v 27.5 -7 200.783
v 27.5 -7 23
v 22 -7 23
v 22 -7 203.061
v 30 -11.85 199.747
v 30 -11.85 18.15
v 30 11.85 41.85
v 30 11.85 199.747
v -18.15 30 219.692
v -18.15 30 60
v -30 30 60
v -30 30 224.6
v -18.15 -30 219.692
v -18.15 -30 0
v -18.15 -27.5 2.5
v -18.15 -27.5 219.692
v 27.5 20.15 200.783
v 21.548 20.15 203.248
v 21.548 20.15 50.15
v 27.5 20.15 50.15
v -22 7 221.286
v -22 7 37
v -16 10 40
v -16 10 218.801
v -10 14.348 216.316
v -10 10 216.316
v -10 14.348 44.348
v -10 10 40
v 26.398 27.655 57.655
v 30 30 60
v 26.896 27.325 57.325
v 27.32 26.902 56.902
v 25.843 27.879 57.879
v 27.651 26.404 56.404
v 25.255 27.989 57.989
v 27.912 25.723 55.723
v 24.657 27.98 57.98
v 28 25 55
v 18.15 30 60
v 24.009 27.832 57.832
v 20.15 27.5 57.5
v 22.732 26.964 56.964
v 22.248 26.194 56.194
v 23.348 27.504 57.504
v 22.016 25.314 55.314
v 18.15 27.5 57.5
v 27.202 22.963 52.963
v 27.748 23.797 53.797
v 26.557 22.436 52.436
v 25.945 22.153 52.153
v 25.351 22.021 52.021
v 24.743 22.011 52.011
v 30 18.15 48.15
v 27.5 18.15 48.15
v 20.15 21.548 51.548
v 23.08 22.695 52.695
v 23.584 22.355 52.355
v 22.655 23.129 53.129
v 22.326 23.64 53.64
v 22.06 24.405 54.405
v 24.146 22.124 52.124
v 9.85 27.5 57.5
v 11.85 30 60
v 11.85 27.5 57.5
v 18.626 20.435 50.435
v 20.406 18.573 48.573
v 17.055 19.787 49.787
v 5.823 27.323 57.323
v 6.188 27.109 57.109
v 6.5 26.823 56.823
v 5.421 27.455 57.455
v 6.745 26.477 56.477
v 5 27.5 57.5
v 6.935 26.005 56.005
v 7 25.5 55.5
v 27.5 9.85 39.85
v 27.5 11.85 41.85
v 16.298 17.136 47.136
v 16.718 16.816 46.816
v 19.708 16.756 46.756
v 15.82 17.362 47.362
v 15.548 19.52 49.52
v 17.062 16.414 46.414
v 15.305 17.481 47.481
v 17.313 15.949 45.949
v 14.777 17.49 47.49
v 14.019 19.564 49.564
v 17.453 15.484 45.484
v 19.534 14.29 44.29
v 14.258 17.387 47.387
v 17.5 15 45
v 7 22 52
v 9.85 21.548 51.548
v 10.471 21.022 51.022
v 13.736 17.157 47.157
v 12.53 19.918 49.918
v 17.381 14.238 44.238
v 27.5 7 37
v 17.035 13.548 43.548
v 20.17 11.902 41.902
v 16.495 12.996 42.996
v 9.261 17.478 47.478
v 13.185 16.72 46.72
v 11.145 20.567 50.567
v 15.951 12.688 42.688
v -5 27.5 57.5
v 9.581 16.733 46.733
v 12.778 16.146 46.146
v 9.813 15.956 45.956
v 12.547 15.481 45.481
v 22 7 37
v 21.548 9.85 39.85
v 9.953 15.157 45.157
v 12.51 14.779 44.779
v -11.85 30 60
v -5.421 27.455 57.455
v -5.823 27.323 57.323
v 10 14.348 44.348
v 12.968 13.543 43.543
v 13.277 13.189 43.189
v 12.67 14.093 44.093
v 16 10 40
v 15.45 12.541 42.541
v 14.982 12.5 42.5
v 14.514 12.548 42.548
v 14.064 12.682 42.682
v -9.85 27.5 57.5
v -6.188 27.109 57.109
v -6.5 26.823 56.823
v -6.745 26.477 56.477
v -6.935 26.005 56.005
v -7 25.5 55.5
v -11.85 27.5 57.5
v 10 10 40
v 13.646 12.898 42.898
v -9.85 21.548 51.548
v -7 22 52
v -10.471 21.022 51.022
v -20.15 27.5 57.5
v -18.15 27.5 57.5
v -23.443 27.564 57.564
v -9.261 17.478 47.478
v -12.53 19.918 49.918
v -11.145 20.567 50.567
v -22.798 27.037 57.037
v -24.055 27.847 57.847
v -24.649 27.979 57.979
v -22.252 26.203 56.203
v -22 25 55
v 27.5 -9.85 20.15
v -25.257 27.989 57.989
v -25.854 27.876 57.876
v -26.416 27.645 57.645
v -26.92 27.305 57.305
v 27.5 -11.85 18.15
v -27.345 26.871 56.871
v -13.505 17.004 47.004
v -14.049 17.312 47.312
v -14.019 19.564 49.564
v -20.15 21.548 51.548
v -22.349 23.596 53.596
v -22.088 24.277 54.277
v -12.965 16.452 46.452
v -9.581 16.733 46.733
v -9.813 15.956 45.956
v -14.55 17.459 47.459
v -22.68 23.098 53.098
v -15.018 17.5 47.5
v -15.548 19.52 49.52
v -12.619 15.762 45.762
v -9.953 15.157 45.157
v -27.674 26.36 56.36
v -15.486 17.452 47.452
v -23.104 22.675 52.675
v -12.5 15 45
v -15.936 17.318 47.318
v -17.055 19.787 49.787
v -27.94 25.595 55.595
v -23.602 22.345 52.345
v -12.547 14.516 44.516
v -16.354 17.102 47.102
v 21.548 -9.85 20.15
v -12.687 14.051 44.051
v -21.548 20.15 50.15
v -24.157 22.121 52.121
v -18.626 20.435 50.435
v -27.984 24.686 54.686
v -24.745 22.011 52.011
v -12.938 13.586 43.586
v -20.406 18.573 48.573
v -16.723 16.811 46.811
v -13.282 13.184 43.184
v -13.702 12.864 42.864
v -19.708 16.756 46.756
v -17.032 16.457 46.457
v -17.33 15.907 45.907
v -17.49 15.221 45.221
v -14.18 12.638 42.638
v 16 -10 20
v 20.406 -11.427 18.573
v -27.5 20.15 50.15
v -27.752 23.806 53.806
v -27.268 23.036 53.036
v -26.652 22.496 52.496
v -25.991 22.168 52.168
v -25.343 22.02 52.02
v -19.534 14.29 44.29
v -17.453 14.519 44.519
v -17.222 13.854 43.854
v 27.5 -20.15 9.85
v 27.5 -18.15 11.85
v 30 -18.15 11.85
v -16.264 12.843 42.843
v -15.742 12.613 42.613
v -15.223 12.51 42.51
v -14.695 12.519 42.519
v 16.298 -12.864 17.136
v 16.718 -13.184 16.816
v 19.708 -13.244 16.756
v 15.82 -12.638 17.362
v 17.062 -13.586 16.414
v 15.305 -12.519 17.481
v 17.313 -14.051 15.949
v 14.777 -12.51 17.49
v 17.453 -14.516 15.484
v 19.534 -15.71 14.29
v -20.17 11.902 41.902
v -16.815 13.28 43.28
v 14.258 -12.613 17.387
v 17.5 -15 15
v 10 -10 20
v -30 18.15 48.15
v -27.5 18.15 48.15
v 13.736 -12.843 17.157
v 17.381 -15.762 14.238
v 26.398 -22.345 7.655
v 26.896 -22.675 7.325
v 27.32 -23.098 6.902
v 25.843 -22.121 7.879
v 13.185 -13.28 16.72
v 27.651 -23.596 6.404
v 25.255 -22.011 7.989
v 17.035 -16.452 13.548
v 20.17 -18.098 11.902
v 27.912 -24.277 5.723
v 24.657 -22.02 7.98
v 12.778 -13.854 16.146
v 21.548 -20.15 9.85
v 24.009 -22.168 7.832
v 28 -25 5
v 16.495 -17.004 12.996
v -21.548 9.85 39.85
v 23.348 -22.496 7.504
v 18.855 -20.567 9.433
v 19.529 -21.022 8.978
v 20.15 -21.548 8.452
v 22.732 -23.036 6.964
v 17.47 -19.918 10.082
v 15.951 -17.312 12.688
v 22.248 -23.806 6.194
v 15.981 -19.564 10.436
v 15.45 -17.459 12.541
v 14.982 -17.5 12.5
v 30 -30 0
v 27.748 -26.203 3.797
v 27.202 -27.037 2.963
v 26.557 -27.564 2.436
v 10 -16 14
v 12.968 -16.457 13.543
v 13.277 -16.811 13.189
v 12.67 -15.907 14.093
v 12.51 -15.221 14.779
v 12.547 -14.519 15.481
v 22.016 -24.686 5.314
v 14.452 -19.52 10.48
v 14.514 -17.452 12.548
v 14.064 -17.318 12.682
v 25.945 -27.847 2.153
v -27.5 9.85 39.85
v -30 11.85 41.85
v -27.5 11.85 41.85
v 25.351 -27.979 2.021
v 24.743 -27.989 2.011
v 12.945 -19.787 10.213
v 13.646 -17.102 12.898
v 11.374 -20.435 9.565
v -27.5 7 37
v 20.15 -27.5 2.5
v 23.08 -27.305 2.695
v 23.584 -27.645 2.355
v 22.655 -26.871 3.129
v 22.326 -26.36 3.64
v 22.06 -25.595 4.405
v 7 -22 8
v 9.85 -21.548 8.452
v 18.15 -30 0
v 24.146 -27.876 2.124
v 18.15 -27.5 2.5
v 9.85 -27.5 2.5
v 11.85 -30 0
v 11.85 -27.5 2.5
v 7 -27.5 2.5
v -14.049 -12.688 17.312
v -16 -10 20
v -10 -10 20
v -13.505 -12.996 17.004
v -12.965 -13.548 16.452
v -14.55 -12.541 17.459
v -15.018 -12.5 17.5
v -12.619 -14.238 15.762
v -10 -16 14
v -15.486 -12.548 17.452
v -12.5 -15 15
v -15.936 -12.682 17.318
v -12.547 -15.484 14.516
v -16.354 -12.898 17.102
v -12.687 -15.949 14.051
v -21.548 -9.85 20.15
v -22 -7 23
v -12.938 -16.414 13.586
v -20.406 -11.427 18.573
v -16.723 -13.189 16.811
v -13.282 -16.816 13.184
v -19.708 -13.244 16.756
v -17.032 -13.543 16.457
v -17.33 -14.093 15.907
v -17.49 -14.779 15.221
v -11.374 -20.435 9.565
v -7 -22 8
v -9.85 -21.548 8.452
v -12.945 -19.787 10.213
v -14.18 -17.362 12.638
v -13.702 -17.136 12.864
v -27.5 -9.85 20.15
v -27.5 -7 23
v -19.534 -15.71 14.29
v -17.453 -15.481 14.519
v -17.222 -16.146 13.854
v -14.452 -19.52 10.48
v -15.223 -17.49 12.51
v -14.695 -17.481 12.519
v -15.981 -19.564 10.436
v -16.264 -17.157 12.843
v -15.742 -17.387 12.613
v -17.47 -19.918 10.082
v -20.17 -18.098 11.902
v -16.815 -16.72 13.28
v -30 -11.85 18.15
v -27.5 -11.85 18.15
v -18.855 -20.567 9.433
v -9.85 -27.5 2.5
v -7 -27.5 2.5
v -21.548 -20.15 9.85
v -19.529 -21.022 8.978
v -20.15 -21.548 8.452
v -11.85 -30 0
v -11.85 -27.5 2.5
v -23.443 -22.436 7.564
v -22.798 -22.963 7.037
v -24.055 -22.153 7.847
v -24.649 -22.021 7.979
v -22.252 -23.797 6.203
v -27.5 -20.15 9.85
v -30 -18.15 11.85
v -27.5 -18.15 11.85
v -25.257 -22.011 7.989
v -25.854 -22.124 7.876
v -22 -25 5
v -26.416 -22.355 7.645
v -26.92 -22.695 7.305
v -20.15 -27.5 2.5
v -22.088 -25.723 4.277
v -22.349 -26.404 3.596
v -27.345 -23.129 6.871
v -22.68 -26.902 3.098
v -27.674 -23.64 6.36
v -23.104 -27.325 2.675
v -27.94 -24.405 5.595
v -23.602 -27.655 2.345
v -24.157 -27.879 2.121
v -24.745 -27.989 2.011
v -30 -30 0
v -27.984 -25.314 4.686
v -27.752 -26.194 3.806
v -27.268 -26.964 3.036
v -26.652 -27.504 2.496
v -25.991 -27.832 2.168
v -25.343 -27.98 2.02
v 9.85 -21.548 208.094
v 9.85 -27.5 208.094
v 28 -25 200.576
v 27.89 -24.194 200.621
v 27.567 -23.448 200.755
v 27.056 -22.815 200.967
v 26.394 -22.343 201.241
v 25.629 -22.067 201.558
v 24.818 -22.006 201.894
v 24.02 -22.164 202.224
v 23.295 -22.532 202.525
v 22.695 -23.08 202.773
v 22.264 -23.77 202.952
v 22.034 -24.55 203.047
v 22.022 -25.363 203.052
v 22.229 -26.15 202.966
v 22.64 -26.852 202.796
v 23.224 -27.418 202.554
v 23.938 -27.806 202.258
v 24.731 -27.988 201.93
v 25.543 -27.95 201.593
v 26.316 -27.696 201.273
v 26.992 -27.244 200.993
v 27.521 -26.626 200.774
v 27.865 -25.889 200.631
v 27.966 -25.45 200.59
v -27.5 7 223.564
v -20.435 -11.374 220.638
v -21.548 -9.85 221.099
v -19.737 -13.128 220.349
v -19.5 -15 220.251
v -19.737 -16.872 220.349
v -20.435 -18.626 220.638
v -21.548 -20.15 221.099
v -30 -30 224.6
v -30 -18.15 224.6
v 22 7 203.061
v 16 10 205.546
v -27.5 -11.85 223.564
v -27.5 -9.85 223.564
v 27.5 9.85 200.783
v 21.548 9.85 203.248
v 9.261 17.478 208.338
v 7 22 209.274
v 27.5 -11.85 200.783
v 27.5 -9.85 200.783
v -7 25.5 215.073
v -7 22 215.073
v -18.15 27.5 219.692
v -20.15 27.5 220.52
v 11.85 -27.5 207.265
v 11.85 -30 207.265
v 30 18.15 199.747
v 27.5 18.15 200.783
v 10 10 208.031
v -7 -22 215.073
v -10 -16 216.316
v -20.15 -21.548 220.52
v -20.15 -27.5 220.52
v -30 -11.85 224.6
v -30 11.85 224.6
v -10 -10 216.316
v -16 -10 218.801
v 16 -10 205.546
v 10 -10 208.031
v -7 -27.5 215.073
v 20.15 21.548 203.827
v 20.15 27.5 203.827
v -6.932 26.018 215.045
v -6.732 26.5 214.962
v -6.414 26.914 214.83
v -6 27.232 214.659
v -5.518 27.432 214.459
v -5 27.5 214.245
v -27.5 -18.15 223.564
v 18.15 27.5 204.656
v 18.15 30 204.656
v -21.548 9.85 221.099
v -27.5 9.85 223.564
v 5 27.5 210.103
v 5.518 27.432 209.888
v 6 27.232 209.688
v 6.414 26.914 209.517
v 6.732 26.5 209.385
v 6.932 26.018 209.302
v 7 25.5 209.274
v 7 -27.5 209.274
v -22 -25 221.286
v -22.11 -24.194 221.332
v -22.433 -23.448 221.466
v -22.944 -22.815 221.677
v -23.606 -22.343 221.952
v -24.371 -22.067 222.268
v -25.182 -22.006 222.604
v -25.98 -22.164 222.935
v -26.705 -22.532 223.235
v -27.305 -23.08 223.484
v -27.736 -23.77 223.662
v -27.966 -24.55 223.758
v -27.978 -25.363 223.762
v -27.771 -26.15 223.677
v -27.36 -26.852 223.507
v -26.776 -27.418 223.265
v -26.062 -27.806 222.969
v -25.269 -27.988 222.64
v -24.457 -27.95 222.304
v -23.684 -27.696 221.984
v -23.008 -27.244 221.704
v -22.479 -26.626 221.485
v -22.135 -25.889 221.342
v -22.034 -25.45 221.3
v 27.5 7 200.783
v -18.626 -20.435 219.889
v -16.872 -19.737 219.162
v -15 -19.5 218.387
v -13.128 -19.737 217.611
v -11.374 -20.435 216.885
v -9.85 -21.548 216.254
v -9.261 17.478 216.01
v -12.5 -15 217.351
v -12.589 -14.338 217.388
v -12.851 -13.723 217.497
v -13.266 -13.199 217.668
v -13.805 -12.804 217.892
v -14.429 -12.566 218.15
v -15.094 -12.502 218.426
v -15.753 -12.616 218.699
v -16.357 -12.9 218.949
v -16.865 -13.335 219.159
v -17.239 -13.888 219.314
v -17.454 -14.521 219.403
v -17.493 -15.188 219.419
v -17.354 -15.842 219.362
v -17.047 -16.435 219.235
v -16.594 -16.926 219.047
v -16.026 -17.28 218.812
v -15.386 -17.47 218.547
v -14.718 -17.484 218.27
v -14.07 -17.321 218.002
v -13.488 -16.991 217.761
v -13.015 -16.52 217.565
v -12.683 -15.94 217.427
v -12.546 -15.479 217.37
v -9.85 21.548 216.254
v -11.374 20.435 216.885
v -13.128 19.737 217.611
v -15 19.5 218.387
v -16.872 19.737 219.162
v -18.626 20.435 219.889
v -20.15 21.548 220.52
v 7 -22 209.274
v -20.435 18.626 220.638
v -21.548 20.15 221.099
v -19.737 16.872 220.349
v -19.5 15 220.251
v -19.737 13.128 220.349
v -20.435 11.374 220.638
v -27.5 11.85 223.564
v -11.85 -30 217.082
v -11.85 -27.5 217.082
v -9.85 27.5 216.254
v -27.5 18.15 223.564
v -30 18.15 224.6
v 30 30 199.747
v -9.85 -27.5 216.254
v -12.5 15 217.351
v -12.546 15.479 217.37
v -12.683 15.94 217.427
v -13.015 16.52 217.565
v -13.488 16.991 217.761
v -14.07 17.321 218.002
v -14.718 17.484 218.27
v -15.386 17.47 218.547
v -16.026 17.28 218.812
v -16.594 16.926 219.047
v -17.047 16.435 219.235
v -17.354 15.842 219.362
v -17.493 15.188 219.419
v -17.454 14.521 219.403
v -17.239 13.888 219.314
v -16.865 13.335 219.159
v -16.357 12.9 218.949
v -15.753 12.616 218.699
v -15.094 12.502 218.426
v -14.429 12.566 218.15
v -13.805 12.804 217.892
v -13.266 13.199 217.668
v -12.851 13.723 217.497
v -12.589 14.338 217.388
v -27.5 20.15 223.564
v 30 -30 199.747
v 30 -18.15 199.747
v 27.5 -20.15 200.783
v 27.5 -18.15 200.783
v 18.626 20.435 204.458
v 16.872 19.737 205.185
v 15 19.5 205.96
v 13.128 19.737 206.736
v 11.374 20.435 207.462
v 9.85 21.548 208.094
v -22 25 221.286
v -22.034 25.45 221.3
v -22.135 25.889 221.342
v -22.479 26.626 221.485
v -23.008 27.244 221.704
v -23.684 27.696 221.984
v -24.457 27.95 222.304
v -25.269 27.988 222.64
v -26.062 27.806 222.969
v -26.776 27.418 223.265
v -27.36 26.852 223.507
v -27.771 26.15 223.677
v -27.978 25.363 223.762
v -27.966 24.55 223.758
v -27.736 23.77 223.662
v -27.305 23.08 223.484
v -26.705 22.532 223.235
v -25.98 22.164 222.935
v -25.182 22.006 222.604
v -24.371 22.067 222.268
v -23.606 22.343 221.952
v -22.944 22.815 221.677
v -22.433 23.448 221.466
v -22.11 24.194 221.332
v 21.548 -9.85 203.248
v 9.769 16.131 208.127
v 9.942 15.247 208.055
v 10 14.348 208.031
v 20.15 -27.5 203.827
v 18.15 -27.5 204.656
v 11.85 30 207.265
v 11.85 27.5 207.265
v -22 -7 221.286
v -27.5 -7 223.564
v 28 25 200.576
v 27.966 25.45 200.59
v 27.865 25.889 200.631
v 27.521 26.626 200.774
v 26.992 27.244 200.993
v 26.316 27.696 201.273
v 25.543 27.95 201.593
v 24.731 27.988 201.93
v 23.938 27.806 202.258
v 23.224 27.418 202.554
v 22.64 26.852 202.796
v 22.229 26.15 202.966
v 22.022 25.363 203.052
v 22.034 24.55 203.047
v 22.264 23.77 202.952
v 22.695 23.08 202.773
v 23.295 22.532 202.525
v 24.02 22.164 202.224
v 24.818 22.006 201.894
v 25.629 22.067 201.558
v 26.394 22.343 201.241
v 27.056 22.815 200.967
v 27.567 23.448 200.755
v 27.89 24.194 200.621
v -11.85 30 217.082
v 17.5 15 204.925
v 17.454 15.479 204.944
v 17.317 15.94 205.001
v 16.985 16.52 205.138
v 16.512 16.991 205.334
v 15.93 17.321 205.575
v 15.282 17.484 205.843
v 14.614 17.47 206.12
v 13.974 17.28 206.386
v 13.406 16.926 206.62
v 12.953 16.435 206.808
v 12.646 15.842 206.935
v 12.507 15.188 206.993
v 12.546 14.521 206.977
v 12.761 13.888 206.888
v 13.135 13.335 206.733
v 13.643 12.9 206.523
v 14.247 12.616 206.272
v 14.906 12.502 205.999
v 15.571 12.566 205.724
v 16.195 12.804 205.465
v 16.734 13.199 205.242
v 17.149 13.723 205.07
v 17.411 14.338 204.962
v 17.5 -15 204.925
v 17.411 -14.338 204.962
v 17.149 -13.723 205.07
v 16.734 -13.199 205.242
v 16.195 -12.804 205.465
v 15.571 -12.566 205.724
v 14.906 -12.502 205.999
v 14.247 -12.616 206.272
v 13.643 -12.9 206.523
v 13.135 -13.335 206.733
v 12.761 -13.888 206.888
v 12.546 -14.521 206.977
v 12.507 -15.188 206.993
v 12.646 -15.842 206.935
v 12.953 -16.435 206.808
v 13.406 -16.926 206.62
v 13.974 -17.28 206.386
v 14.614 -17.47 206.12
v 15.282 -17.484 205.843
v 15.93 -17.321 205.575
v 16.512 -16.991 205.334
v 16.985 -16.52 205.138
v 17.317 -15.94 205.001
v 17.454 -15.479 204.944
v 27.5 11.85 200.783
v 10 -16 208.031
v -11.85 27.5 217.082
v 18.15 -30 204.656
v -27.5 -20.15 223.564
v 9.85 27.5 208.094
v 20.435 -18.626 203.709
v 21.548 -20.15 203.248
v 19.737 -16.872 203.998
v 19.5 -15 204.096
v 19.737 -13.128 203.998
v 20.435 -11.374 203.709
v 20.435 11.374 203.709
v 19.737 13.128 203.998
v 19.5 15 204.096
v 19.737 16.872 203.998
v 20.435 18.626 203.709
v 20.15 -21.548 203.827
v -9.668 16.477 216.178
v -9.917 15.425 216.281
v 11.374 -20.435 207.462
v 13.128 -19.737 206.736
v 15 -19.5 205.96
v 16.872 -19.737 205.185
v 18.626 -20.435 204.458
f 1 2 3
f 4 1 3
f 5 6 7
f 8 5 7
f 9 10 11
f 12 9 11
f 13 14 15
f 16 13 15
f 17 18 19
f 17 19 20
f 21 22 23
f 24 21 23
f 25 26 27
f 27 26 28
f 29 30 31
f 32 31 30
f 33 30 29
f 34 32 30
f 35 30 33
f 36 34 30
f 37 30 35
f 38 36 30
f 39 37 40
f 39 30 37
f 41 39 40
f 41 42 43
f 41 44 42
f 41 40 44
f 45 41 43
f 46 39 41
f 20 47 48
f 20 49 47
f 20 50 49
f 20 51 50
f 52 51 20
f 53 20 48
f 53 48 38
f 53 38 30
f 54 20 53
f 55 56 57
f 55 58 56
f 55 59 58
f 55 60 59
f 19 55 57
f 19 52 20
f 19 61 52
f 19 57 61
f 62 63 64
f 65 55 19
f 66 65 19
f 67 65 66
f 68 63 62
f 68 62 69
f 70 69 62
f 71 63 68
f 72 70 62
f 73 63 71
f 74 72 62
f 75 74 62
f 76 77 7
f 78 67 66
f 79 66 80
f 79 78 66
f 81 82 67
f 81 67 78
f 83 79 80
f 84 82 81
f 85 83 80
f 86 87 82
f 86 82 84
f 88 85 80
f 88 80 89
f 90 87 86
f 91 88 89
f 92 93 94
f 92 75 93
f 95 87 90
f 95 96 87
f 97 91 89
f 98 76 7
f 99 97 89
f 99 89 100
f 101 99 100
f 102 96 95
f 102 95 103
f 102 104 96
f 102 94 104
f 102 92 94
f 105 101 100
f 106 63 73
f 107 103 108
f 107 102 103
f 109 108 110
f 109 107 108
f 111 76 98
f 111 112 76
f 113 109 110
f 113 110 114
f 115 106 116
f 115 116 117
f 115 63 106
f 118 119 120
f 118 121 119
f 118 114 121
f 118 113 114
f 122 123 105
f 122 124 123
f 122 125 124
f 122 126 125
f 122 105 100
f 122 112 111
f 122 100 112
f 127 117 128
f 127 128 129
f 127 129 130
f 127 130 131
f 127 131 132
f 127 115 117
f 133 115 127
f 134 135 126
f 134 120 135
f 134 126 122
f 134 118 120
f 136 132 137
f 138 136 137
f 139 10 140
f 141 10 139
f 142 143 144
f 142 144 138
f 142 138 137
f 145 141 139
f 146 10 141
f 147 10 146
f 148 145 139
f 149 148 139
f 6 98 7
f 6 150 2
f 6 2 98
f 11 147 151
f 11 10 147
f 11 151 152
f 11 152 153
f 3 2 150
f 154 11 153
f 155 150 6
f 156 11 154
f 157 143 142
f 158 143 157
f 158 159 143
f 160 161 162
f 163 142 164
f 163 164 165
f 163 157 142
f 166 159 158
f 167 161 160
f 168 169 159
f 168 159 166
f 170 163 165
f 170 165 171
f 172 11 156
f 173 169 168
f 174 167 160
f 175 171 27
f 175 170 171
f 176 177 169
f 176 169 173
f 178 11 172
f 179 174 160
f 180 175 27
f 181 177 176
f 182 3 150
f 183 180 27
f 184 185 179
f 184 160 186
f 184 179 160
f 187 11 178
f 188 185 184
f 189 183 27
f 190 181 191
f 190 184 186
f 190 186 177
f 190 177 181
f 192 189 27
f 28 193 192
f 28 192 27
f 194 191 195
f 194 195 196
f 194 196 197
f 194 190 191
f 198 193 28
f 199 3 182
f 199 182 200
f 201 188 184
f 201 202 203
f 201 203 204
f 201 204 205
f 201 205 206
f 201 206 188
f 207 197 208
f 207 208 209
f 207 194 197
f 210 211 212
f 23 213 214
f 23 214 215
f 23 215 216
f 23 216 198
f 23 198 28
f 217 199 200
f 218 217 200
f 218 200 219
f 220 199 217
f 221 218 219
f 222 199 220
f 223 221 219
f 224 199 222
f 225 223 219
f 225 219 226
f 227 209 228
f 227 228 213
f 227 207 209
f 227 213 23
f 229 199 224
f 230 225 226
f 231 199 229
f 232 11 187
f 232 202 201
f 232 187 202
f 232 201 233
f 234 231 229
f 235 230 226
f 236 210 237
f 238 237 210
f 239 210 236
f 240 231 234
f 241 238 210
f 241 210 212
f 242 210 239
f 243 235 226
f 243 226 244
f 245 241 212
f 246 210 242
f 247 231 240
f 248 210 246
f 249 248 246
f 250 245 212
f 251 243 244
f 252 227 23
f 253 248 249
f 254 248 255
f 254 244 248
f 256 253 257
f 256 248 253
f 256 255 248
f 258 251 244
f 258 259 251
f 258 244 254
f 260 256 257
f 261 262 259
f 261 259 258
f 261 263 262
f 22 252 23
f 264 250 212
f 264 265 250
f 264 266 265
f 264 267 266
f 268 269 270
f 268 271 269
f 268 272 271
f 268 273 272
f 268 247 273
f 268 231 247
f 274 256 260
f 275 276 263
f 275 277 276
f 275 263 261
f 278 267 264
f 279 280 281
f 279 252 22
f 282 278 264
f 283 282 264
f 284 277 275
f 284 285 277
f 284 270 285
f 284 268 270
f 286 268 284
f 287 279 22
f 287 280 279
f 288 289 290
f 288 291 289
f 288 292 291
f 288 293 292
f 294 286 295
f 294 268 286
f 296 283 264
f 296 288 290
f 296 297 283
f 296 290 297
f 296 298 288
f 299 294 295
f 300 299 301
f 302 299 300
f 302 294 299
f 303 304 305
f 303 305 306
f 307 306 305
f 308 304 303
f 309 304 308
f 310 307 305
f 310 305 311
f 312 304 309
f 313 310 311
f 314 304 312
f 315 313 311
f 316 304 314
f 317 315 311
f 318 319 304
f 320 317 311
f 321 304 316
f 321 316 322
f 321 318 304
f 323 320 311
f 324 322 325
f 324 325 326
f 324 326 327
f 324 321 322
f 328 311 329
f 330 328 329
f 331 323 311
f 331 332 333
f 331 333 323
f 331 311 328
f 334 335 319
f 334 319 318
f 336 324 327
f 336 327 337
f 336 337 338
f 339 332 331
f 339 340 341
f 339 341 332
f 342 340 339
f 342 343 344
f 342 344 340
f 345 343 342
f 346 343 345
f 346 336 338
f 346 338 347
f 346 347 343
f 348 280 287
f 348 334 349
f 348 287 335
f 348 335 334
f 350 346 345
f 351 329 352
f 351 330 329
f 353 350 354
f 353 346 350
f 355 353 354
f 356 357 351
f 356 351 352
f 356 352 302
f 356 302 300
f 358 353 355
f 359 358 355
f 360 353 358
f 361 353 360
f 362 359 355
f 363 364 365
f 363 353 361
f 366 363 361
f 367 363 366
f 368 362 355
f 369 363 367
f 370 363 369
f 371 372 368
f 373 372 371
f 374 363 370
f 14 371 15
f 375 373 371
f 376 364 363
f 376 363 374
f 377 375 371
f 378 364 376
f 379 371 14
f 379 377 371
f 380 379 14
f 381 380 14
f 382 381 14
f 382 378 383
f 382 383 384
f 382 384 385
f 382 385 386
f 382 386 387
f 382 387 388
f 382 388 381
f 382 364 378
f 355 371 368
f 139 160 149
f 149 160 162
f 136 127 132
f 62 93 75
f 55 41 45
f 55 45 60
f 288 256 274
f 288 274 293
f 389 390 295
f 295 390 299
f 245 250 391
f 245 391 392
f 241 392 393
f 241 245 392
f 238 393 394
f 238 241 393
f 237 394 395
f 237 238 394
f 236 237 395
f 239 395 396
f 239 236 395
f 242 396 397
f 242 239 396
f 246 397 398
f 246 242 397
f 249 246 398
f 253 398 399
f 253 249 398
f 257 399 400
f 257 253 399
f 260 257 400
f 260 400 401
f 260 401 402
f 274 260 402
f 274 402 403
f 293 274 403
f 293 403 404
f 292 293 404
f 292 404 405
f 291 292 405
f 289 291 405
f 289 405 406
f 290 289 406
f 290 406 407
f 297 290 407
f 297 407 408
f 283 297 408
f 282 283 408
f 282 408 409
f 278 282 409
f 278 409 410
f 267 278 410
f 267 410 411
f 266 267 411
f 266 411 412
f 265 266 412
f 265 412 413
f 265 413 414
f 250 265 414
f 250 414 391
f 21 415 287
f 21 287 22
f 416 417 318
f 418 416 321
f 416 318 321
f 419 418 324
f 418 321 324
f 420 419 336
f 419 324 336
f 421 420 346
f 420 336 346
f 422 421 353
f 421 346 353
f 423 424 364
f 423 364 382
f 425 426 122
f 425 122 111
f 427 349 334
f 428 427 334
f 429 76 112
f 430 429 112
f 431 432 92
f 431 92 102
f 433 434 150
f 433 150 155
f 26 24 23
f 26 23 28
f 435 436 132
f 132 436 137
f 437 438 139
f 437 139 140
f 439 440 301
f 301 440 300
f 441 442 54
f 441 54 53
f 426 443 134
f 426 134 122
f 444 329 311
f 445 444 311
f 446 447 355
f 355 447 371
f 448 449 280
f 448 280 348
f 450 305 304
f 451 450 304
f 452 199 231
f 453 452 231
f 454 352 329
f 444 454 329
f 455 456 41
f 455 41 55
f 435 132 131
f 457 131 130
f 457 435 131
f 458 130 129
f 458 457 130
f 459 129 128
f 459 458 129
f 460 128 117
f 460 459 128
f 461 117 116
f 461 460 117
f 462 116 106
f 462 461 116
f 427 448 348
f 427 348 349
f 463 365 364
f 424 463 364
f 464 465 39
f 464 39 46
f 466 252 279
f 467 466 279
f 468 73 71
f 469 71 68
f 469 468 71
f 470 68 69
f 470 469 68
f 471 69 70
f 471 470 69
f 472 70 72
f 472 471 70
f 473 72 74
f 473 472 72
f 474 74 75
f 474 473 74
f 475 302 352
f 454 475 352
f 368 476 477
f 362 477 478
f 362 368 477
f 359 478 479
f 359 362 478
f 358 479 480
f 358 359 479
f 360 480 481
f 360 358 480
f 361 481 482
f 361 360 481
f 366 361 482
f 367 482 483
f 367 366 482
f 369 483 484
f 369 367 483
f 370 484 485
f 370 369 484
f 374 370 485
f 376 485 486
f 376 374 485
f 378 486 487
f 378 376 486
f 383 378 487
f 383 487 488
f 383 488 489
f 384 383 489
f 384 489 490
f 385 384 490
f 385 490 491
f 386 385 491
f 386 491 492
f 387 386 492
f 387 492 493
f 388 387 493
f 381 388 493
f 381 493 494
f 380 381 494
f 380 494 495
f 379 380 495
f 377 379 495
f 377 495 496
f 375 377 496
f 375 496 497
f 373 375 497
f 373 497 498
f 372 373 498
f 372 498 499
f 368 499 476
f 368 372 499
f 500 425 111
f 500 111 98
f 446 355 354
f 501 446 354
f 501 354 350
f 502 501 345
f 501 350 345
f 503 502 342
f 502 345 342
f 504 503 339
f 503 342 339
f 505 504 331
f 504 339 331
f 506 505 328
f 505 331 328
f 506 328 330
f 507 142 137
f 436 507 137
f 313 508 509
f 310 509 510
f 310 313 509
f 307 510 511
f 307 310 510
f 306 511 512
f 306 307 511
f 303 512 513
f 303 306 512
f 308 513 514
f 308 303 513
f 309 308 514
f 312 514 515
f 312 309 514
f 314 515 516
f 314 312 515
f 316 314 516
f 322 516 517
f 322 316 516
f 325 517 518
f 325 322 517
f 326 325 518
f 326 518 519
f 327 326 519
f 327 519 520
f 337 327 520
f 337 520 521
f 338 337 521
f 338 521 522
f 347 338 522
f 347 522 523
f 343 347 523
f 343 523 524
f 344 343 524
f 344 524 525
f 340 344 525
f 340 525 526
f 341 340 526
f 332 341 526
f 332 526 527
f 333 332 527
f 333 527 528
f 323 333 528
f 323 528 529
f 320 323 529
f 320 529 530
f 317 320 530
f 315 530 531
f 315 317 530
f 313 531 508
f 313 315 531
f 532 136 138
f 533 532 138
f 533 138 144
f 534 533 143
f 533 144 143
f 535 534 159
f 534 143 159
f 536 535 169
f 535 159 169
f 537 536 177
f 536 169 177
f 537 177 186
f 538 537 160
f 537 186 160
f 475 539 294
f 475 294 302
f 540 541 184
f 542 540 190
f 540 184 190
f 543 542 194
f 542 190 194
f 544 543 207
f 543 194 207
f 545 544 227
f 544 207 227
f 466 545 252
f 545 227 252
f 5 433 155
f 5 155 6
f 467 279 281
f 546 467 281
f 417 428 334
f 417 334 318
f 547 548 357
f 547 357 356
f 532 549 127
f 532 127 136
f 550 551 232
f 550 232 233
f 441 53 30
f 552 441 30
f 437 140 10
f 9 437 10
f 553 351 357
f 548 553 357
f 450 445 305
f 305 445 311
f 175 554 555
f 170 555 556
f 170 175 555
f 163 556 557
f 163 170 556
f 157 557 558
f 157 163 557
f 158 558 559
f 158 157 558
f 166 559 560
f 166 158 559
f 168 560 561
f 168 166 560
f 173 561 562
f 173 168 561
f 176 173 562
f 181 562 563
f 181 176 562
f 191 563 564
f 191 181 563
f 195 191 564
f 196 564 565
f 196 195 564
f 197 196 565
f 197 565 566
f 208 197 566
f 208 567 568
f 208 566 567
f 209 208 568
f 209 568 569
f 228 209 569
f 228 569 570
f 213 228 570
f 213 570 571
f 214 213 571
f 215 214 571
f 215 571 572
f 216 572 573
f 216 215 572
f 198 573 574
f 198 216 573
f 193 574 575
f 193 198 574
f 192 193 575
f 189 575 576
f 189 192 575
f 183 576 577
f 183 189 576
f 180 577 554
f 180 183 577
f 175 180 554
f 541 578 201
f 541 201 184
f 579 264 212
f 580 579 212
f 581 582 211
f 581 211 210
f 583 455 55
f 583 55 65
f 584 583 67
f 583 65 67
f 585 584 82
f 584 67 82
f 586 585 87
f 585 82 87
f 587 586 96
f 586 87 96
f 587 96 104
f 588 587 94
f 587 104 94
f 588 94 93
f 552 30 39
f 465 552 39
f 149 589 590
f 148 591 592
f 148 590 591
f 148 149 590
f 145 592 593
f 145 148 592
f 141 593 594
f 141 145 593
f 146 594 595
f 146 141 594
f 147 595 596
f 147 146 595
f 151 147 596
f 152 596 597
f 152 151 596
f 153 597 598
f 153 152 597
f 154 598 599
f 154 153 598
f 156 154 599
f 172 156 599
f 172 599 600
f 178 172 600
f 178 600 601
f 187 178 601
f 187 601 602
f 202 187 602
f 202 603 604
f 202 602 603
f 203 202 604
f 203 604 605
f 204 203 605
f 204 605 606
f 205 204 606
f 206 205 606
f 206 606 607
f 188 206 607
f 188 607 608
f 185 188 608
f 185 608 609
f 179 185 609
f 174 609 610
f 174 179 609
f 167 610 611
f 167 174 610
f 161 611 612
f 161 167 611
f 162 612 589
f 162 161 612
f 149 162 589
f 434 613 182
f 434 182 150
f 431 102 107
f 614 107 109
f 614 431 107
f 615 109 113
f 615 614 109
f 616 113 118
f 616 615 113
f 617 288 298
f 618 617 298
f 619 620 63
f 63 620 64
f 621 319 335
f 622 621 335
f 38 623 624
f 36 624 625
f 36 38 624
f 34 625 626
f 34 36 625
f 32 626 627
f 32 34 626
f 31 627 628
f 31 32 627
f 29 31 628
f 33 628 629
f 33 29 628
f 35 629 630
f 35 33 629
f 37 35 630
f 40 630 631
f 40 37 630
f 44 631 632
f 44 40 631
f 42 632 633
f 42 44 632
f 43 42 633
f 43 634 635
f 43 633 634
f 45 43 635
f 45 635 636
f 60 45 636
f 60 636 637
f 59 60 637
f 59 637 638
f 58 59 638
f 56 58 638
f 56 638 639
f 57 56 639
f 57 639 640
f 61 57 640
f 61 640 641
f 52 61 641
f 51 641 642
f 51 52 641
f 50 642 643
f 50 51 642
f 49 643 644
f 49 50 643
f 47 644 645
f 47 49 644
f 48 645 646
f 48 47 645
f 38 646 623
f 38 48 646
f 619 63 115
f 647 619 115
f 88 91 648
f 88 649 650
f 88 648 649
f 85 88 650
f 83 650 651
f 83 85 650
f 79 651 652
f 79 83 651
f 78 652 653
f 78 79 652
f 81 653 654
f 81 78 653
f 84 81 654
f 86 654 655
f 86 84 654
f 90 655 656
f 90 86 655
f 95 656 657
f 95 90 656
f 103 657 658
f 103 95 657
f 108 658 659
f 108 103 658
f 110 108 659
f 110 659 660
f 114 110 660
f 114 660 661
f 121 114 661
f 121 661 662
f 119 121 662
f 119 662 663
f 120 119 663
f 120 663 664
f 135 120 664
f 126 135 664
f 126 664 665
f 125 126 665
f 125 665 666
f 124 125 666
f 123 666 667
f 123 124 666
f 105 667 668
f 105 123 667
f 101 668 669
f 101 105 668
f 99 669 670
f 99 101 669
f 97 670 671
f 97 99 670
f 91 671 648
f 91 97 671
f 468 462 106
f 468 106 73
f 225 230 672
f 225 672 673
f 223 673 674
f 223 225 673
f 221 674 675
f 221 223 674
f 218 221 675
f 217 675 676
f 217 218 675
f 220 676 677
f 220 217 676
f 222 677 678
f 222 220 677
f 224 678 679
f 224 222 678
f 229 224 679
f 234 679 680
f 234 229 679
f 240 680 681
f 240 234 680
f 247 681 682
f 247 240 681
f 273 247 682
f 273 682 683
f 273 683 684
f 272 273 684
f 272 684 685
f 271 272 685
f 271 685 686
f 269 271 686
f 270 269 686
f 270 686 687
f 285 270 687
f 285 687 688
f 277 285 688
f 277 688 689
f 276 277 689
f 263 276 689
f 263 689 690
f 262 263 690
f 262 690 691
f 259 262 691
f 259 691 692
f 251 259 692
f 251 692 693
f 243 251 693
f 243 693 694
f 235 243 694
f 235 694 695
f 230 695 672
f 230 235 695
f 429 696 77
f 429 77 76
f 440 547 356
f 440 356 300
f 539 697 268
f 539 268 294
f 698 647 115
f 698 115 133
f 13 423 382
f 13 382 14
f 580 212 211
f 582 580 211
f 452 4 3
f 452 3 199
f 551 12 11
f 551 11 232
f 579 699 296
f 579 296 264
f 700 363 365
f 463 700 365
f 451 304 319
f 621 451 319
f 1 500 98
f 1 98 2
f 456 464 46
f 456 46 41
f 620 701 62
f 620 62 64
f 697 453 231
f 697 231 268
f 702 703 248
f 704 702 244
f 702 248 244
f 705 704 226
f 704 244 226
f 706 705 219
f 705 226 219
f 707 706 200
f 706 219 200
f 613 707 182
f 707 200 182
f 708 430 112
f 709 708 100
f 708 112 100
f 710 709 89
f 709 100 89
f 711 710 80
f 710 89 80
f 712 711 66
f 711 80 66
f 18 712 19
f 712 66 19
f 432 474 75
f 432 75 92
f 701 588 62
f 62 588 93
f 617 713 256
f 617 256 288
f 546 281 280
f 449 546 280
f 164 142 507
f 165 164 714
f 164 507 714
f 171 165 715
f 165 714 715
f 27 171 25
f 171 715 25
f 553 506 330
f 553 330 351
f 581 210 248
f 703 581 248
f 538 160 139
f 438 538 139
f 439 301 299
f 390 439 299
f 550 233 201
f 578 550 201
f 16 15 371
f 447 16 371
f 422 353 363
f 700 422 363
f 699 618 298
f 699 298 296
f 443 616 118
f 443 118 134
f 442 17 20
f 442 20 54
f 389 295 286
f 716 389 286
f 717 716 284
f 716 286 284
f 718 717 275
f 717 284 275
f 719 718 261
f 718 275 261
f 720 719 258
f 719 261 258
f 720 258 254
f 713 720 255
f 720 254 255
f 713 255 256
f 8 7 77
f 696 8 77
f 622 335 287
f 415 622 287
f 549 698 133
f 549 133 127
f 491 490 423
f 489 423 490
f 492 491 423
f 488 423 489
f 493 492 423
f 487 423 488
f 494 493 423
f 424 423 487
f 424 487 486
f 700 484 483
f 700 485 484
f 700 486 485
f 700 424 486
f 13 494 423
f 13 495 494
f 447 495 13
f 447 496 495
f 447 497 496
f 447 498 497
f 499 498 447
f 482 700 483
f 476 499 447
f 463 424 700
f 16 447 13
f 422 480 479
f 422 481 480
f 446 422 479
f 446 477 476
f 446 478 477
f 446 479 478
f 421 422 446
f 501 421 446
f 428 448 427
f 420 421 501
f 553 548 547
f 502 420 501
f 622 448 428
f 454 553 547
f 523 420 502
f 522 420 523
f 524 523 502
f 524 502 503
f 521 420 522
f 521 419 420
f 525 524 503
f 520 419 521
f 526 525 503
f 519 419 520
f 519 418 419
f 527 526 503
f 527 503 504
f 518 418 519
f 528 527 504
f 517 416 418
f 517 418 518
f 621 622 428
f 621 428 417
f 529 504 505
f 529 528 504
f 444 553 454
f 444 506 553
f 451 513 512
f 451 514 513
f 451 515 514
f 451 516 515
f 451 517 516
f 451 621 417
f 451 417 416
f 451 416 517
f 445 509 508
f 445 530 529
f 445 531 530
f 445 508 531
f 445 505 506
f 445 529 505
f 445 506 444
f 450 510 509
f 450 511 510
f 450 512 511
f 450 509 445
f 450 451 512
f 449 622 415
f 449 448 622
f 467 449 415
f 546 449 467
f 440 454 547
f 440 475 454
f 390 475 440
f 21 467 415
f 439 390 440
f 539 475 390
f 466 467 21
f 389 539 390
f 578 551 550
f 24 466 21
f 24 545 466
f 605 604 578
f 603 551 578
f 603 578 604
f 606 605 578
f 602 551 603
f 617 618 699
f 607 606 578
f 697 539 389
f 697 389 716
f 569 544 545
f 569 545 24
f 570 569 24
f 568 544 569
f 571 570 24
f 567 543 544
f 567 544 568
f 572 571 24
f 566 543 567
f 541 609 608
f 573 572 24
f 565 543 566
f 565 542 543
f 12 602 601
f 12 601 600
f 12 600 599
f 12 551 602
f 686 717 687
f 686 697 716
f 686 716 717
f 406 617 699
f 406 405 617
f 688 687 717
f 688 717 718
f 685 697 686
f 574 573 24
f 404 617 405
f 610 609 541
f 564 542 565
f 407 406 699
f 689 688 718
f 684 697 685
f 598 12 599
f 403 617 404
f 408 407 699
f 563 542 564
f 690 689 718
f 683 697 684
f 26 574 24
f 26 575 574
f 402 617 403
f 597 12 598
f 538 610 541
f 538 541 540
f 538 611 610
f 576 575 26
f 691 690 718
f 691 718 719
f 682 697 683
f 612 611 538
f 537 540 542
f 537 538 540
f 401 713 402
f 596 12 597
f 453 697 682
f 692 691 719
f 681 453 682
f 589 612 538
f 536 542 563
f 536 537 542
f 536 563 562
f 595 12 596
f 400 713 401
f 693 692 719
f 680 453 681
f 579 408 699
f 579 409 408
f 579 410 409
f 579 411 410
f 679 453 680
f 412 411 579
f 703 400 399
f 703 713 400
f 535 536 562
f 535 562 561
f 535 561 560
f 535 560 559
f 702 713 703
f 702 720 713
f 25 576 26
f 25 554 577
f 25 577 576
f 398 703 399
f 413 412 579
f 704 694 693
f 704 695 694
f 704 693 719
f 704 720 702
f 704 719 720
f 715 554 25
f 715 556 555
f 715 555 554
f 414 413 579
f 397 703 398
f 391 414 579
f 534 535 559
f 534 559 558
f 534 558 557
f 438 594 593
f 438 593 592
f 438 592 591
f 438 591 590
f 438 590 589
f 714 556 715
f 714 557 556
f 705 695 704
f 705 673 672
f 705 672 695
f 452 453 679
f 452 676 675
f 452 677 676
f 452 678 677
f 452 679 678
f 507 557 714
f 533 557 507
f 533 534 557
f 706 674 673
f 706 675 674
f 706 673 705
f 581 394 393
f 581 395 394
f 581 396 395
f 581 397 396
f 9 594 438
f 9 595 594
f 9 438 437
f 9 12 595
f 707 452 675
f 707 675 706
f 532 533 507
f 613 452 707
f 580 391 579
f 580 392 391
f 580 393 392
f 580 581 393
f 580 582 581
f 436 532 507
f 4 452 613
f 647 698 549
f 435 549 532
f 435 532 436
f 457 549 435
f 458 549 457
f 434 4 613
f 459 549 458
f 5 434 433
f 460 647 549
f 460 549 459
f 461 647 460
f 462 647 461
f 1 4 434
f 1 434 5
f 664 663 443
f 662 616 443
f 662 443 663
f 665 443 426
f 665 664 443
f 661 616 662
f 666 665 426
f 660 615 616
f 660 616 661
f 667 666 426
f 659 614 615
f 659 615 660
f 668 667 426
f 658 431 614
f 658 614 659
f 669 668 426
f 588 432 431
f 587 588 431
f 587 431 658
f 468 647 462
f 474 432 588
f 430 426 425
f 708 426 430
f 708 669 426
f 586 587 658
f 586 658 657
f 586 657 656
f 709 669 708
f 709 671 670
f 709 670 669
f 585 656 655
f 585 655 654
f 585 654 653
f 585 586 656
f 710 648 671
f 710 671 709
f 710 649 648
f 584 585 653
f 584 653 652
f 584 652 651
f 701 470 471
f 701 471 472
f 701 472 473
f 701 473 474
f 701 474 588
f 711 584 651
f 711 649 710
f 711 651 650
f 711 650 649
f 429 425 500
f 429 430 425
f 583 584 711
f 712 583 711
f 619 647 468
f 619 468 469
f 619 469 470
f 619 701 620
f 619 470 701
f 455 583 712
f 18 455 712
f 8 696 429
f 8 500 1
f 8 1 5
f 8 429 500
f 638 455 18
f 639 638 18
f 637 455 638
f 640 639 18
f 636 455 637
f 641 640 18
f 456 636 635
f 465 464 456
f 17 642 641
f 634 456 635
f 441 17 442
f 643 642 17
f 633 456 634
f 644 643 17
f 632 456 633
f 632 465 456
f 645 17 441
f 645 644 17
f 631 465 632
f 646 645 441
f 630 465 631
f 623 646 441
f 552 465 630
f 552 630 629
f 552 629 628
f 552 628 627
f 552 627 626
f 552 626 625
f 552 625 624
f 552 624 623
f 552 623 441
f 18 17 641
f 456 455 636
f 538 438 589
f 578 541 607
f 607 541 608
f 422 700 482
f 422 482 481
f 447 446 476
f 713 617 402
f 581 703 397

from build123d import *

# Parameters (mm, degrees)
F0_R          = 3
F0_R_2        = 2.5
F1_DEPTH      = 224.6
F2_R          = 2
F3_R          = 7
F6_DEPTH      = 30
F6_DEPTH_BACK = 30
F8_DEPTH      = 30
F8_DEPTH_BACK = 30


# Not quite as in the source:
# - a feature names something its author has since deleted; it is built from what else it names


with BuildPart() as f1:
    # F0 (on Top) → F1 (new body)
    with BuildSketch(Plane.XY):
        with BuildLine():
            Line((18.15, -30), (30, -30))
            Line((30, -30), (30, -18.15))
            Line((30, -18.15), (27.5, -18.15))
            Line((27.5, -18.15), (27.5, -20.15))
            Line((27.5, -20.15), (21.5477069044, -20.15))
            ThreePointArc((21.5477069044, -20.15), (19.5, -15), (21.5477069044, -9.85))
            Line((21.5477069044, -9.85), (27.5, -9.85))
            Line((27.5, -9.85), (27.5, -11.85))
            Line((27.5, -11.85), (30, -11.85))
            Line((30, -11.85), (30, 11.85))
            Line((30, 11.85), (27.5, 11.85))
            Line((27.5, 11.85), (27.5, 9.85))
            Line((27.5, 9.85), (21.5477069044, 9.85))
            ThreePointArc((21.5477069044, 9.85), (19.5, 15), (21.5477069044, 20.15))
            Line((21.5477069044, 20.15), (27.5, 20.15))
            Line((27.5, 20.15), (27.5, 18.15))
            Line((27.5, 18.15), (30, 18.15))
            Line((30, 18.15), (30, 30))
            Line((30, 30), (18.15, 30))
            Line((18.15, 30), (18.15, 27.5))
            Line((18.15, 27.5), (20.15, 27.5))
            Line((20.15, 27.5), (20.15, 21.5477069044))
            ThreePointArc((20.15, 21.5477069044), (15, 19.5), (9.85, 21.5477069044))
            Line((9.85, 21.5477069044), (9.85, 27.5))
            Line((9.85, 27.5), (11.85, 27.5))
            Line((11.85, 27.5), (11.85, 30))
            Line((11.85, 30), (-11.85, 30))
            Line((-11.85, 30), (-11.85, 27.5))
            Line((-11.85, 27.5), (-9.85, 27.5))
            Line((-9.85, 27.5), (-9.85, 21.5477069044))
            ThreePointArc((-9.85, 21.5477069044), (-15, 19.5), (-20.15, 21.5477069044))
            Line((-20.15, 21.5477069044), (-20.15, 27.5))
            Line((-20.15, 27.5), (-18.15, 27.5))
            Line((-18.15, 27.5), (-18.15, 30))
            Line((-18.15, 30), (-30, 30))
            Line((-30, 30), (-30, 18.15))
            Line((-30, 18.15), (-27.5, 18.15))
            Line((-27.5, 18.15), (-27.5, 20.15))
            Line((-27.5, 20.15), (-21.5477069044, 20.15))
            ThreePointArc((-21.5477069044, 20.15), (-19.5, 15), (-21.5477069044, 9.85))
            Line((-21.5477069044, 9.85), (-27.5, 9.85))
            Line((-27.5, 9.85), (-27.5, 11.85))
            Line((-27.5, 11.85), (-30, 11.85))
            Line((-30, 11.85), (-30, -11.85))
            Line((-30, -11.85), (-27.5, -11.85))
            Line((-27.5, -11.85), (-27.5, -9.85))
            Line((-27.5, -9.85), (-21.5477069044, -9.85))
            ThreePointArc((-21.5477069044, -9.85), (-19.5, -15), (-21.5477069044, -20.15))
            Line((-21.5477069044, -20.15), (-27.5, -20.15))
            Line((-27.5, -20.15), (-27.5, -18.15))
            Line((-27.5, -18.15), (-30, -18.15))
            Line((-30, -18.15), (-30, -30))
            Line((-30, -30), (-18.15, -30))
            Line((-18.15, -30), (-18.15, -27.5))
            Line((-18.15, -27.5), (-20.15, -27.5))
            Line((-20.15, -27.5), (-20.15, -21.5477069044))
            ThreePointArc((-20.15, -21.5477069044), (-15, -19.5), (-9.85, -21.5477069044))
            Line((-9.85, -21.5477069044), (-9.85, -27.5))
            Line((-9.85, -27.5), (-11.85, -27.5))
            Line((-11.85, -27.5), (-11.85, -30))
            Line((-11.85, -30), (11.85, -30))
            Line((11.85, -30), (11.85, -27.5))
            Line((11.85, -27.5), (9.85, -27.5))
            Line((9.85, -27.5), (9.85, -21.5477069044))
            ThreePointArc((9.85, -21.5477069044), (15, -19.5), (20.15, -21.5477069044))
            Line((20.15, -21.5477069044), (20.15, -27.5))
            Line((20.15, -27.5), (18.15, -27.5))
            Line((18.15, -27.5), (18.15, -30))
        make_face()
        with Locations((-25, -25)):
            Circle(F0_R, mode=Mode.SUBTRACT)
        with Locations((-15, -15)):
            Circle(F0_R_2, mode=Mode.SUBTRACT)
        with Locations((25, -25)):
            Circle(F0_R, mode=Mode.SUBTRACT)
        with Locations((15, -15)):
            Circle(F0_R_2, mode=Mode.SUBTRACT)
        with Locations((-25, 25)):
            Circle(F0_R, mode=Mode.SUBTRACT)
        with Locations((-15, 15)):
            Circle(F0_R_2, mode=Mode.SUBTRACT)
        Polygon((-7, 22), (-7, 27.5), (0, 27.5), (7, 27.5), (7, 22), (10, 16), (10, 10), (16, 10), (22, 7), (27.5, 7), (27.5, 0), (27.5, -7), (22, -7), (16, -10), (10, -10), (10, -16), (7, -22), (7, -27.5), (0, -27.5), (-7, -27.5), (-7, -22), (-10, -16), (-10, -10), (-16, -10), (-22, -7), (-27.5, -7), (-27.5, 0), (-27.5, 7), (-22, 7), (-16, 10), (-10, 10), (-10, 16), align=None, mode=Mode.SUBTRACT)
        with Locations((15, 15)):
            Circle(F0_R_2, mode=Mode.SUBTRACT)
        with Locations((25, 25)):
            Circle(F0_R, mode=Mode.SUBTRACT)
    extrude(amount=F1_DEPTH)

    # F2
    f2_edges = [f1.edges().sort_by_distance(p)[0] for p in [
        (-7, 27.5, 112.3),
        (7, 27.5, 112.3),
    ]]
    fillet(f2_edges, radius=F2_R)

    # F3
    f3_edges = [f1.edges().sort_by_distance(p)[0] for p in [
        (-10, 16, 112.3),
        (10, 16, 112.3),
    ]]
    fillet(f3_edges, radius=F3_R)

    # F5 (on Right) → F6 (cut, two sides)
    with BuildSketch(Plane.YZ) as f6_sk:
        Polygon((70.3932136338, -100.3932136338), (211.6390804038, 40.8526531362), (111.24586677, 141.24586677), (-30, 0), align=None)
    extrude(amount=-F6_DEPTH, mode=Mode.SUBTRACT)
    extrude(f6_sk.sketch, amount=F6_DEPTH_BACK, mode=Mode.SUBTRACT)

    # F7 (on Front) → F8 (cut, two sides)
    with BuildSketch(Plane.XZ) as f8_sk:
        Polygon((136.0873846676, 331.4359196356), (32.0951359741, 374.5109194261), (-30, 224.6), (73.9922486935, 181.5250002095), align=None)
    extrude(amount=F8_DEPTH, mode=Mode.SUBTRACT)
    extrude(f8_sk.sketch, amount=-F8_DEPTH_BACK, mode=Mode.SUBTRACT)


solid = f1.part
